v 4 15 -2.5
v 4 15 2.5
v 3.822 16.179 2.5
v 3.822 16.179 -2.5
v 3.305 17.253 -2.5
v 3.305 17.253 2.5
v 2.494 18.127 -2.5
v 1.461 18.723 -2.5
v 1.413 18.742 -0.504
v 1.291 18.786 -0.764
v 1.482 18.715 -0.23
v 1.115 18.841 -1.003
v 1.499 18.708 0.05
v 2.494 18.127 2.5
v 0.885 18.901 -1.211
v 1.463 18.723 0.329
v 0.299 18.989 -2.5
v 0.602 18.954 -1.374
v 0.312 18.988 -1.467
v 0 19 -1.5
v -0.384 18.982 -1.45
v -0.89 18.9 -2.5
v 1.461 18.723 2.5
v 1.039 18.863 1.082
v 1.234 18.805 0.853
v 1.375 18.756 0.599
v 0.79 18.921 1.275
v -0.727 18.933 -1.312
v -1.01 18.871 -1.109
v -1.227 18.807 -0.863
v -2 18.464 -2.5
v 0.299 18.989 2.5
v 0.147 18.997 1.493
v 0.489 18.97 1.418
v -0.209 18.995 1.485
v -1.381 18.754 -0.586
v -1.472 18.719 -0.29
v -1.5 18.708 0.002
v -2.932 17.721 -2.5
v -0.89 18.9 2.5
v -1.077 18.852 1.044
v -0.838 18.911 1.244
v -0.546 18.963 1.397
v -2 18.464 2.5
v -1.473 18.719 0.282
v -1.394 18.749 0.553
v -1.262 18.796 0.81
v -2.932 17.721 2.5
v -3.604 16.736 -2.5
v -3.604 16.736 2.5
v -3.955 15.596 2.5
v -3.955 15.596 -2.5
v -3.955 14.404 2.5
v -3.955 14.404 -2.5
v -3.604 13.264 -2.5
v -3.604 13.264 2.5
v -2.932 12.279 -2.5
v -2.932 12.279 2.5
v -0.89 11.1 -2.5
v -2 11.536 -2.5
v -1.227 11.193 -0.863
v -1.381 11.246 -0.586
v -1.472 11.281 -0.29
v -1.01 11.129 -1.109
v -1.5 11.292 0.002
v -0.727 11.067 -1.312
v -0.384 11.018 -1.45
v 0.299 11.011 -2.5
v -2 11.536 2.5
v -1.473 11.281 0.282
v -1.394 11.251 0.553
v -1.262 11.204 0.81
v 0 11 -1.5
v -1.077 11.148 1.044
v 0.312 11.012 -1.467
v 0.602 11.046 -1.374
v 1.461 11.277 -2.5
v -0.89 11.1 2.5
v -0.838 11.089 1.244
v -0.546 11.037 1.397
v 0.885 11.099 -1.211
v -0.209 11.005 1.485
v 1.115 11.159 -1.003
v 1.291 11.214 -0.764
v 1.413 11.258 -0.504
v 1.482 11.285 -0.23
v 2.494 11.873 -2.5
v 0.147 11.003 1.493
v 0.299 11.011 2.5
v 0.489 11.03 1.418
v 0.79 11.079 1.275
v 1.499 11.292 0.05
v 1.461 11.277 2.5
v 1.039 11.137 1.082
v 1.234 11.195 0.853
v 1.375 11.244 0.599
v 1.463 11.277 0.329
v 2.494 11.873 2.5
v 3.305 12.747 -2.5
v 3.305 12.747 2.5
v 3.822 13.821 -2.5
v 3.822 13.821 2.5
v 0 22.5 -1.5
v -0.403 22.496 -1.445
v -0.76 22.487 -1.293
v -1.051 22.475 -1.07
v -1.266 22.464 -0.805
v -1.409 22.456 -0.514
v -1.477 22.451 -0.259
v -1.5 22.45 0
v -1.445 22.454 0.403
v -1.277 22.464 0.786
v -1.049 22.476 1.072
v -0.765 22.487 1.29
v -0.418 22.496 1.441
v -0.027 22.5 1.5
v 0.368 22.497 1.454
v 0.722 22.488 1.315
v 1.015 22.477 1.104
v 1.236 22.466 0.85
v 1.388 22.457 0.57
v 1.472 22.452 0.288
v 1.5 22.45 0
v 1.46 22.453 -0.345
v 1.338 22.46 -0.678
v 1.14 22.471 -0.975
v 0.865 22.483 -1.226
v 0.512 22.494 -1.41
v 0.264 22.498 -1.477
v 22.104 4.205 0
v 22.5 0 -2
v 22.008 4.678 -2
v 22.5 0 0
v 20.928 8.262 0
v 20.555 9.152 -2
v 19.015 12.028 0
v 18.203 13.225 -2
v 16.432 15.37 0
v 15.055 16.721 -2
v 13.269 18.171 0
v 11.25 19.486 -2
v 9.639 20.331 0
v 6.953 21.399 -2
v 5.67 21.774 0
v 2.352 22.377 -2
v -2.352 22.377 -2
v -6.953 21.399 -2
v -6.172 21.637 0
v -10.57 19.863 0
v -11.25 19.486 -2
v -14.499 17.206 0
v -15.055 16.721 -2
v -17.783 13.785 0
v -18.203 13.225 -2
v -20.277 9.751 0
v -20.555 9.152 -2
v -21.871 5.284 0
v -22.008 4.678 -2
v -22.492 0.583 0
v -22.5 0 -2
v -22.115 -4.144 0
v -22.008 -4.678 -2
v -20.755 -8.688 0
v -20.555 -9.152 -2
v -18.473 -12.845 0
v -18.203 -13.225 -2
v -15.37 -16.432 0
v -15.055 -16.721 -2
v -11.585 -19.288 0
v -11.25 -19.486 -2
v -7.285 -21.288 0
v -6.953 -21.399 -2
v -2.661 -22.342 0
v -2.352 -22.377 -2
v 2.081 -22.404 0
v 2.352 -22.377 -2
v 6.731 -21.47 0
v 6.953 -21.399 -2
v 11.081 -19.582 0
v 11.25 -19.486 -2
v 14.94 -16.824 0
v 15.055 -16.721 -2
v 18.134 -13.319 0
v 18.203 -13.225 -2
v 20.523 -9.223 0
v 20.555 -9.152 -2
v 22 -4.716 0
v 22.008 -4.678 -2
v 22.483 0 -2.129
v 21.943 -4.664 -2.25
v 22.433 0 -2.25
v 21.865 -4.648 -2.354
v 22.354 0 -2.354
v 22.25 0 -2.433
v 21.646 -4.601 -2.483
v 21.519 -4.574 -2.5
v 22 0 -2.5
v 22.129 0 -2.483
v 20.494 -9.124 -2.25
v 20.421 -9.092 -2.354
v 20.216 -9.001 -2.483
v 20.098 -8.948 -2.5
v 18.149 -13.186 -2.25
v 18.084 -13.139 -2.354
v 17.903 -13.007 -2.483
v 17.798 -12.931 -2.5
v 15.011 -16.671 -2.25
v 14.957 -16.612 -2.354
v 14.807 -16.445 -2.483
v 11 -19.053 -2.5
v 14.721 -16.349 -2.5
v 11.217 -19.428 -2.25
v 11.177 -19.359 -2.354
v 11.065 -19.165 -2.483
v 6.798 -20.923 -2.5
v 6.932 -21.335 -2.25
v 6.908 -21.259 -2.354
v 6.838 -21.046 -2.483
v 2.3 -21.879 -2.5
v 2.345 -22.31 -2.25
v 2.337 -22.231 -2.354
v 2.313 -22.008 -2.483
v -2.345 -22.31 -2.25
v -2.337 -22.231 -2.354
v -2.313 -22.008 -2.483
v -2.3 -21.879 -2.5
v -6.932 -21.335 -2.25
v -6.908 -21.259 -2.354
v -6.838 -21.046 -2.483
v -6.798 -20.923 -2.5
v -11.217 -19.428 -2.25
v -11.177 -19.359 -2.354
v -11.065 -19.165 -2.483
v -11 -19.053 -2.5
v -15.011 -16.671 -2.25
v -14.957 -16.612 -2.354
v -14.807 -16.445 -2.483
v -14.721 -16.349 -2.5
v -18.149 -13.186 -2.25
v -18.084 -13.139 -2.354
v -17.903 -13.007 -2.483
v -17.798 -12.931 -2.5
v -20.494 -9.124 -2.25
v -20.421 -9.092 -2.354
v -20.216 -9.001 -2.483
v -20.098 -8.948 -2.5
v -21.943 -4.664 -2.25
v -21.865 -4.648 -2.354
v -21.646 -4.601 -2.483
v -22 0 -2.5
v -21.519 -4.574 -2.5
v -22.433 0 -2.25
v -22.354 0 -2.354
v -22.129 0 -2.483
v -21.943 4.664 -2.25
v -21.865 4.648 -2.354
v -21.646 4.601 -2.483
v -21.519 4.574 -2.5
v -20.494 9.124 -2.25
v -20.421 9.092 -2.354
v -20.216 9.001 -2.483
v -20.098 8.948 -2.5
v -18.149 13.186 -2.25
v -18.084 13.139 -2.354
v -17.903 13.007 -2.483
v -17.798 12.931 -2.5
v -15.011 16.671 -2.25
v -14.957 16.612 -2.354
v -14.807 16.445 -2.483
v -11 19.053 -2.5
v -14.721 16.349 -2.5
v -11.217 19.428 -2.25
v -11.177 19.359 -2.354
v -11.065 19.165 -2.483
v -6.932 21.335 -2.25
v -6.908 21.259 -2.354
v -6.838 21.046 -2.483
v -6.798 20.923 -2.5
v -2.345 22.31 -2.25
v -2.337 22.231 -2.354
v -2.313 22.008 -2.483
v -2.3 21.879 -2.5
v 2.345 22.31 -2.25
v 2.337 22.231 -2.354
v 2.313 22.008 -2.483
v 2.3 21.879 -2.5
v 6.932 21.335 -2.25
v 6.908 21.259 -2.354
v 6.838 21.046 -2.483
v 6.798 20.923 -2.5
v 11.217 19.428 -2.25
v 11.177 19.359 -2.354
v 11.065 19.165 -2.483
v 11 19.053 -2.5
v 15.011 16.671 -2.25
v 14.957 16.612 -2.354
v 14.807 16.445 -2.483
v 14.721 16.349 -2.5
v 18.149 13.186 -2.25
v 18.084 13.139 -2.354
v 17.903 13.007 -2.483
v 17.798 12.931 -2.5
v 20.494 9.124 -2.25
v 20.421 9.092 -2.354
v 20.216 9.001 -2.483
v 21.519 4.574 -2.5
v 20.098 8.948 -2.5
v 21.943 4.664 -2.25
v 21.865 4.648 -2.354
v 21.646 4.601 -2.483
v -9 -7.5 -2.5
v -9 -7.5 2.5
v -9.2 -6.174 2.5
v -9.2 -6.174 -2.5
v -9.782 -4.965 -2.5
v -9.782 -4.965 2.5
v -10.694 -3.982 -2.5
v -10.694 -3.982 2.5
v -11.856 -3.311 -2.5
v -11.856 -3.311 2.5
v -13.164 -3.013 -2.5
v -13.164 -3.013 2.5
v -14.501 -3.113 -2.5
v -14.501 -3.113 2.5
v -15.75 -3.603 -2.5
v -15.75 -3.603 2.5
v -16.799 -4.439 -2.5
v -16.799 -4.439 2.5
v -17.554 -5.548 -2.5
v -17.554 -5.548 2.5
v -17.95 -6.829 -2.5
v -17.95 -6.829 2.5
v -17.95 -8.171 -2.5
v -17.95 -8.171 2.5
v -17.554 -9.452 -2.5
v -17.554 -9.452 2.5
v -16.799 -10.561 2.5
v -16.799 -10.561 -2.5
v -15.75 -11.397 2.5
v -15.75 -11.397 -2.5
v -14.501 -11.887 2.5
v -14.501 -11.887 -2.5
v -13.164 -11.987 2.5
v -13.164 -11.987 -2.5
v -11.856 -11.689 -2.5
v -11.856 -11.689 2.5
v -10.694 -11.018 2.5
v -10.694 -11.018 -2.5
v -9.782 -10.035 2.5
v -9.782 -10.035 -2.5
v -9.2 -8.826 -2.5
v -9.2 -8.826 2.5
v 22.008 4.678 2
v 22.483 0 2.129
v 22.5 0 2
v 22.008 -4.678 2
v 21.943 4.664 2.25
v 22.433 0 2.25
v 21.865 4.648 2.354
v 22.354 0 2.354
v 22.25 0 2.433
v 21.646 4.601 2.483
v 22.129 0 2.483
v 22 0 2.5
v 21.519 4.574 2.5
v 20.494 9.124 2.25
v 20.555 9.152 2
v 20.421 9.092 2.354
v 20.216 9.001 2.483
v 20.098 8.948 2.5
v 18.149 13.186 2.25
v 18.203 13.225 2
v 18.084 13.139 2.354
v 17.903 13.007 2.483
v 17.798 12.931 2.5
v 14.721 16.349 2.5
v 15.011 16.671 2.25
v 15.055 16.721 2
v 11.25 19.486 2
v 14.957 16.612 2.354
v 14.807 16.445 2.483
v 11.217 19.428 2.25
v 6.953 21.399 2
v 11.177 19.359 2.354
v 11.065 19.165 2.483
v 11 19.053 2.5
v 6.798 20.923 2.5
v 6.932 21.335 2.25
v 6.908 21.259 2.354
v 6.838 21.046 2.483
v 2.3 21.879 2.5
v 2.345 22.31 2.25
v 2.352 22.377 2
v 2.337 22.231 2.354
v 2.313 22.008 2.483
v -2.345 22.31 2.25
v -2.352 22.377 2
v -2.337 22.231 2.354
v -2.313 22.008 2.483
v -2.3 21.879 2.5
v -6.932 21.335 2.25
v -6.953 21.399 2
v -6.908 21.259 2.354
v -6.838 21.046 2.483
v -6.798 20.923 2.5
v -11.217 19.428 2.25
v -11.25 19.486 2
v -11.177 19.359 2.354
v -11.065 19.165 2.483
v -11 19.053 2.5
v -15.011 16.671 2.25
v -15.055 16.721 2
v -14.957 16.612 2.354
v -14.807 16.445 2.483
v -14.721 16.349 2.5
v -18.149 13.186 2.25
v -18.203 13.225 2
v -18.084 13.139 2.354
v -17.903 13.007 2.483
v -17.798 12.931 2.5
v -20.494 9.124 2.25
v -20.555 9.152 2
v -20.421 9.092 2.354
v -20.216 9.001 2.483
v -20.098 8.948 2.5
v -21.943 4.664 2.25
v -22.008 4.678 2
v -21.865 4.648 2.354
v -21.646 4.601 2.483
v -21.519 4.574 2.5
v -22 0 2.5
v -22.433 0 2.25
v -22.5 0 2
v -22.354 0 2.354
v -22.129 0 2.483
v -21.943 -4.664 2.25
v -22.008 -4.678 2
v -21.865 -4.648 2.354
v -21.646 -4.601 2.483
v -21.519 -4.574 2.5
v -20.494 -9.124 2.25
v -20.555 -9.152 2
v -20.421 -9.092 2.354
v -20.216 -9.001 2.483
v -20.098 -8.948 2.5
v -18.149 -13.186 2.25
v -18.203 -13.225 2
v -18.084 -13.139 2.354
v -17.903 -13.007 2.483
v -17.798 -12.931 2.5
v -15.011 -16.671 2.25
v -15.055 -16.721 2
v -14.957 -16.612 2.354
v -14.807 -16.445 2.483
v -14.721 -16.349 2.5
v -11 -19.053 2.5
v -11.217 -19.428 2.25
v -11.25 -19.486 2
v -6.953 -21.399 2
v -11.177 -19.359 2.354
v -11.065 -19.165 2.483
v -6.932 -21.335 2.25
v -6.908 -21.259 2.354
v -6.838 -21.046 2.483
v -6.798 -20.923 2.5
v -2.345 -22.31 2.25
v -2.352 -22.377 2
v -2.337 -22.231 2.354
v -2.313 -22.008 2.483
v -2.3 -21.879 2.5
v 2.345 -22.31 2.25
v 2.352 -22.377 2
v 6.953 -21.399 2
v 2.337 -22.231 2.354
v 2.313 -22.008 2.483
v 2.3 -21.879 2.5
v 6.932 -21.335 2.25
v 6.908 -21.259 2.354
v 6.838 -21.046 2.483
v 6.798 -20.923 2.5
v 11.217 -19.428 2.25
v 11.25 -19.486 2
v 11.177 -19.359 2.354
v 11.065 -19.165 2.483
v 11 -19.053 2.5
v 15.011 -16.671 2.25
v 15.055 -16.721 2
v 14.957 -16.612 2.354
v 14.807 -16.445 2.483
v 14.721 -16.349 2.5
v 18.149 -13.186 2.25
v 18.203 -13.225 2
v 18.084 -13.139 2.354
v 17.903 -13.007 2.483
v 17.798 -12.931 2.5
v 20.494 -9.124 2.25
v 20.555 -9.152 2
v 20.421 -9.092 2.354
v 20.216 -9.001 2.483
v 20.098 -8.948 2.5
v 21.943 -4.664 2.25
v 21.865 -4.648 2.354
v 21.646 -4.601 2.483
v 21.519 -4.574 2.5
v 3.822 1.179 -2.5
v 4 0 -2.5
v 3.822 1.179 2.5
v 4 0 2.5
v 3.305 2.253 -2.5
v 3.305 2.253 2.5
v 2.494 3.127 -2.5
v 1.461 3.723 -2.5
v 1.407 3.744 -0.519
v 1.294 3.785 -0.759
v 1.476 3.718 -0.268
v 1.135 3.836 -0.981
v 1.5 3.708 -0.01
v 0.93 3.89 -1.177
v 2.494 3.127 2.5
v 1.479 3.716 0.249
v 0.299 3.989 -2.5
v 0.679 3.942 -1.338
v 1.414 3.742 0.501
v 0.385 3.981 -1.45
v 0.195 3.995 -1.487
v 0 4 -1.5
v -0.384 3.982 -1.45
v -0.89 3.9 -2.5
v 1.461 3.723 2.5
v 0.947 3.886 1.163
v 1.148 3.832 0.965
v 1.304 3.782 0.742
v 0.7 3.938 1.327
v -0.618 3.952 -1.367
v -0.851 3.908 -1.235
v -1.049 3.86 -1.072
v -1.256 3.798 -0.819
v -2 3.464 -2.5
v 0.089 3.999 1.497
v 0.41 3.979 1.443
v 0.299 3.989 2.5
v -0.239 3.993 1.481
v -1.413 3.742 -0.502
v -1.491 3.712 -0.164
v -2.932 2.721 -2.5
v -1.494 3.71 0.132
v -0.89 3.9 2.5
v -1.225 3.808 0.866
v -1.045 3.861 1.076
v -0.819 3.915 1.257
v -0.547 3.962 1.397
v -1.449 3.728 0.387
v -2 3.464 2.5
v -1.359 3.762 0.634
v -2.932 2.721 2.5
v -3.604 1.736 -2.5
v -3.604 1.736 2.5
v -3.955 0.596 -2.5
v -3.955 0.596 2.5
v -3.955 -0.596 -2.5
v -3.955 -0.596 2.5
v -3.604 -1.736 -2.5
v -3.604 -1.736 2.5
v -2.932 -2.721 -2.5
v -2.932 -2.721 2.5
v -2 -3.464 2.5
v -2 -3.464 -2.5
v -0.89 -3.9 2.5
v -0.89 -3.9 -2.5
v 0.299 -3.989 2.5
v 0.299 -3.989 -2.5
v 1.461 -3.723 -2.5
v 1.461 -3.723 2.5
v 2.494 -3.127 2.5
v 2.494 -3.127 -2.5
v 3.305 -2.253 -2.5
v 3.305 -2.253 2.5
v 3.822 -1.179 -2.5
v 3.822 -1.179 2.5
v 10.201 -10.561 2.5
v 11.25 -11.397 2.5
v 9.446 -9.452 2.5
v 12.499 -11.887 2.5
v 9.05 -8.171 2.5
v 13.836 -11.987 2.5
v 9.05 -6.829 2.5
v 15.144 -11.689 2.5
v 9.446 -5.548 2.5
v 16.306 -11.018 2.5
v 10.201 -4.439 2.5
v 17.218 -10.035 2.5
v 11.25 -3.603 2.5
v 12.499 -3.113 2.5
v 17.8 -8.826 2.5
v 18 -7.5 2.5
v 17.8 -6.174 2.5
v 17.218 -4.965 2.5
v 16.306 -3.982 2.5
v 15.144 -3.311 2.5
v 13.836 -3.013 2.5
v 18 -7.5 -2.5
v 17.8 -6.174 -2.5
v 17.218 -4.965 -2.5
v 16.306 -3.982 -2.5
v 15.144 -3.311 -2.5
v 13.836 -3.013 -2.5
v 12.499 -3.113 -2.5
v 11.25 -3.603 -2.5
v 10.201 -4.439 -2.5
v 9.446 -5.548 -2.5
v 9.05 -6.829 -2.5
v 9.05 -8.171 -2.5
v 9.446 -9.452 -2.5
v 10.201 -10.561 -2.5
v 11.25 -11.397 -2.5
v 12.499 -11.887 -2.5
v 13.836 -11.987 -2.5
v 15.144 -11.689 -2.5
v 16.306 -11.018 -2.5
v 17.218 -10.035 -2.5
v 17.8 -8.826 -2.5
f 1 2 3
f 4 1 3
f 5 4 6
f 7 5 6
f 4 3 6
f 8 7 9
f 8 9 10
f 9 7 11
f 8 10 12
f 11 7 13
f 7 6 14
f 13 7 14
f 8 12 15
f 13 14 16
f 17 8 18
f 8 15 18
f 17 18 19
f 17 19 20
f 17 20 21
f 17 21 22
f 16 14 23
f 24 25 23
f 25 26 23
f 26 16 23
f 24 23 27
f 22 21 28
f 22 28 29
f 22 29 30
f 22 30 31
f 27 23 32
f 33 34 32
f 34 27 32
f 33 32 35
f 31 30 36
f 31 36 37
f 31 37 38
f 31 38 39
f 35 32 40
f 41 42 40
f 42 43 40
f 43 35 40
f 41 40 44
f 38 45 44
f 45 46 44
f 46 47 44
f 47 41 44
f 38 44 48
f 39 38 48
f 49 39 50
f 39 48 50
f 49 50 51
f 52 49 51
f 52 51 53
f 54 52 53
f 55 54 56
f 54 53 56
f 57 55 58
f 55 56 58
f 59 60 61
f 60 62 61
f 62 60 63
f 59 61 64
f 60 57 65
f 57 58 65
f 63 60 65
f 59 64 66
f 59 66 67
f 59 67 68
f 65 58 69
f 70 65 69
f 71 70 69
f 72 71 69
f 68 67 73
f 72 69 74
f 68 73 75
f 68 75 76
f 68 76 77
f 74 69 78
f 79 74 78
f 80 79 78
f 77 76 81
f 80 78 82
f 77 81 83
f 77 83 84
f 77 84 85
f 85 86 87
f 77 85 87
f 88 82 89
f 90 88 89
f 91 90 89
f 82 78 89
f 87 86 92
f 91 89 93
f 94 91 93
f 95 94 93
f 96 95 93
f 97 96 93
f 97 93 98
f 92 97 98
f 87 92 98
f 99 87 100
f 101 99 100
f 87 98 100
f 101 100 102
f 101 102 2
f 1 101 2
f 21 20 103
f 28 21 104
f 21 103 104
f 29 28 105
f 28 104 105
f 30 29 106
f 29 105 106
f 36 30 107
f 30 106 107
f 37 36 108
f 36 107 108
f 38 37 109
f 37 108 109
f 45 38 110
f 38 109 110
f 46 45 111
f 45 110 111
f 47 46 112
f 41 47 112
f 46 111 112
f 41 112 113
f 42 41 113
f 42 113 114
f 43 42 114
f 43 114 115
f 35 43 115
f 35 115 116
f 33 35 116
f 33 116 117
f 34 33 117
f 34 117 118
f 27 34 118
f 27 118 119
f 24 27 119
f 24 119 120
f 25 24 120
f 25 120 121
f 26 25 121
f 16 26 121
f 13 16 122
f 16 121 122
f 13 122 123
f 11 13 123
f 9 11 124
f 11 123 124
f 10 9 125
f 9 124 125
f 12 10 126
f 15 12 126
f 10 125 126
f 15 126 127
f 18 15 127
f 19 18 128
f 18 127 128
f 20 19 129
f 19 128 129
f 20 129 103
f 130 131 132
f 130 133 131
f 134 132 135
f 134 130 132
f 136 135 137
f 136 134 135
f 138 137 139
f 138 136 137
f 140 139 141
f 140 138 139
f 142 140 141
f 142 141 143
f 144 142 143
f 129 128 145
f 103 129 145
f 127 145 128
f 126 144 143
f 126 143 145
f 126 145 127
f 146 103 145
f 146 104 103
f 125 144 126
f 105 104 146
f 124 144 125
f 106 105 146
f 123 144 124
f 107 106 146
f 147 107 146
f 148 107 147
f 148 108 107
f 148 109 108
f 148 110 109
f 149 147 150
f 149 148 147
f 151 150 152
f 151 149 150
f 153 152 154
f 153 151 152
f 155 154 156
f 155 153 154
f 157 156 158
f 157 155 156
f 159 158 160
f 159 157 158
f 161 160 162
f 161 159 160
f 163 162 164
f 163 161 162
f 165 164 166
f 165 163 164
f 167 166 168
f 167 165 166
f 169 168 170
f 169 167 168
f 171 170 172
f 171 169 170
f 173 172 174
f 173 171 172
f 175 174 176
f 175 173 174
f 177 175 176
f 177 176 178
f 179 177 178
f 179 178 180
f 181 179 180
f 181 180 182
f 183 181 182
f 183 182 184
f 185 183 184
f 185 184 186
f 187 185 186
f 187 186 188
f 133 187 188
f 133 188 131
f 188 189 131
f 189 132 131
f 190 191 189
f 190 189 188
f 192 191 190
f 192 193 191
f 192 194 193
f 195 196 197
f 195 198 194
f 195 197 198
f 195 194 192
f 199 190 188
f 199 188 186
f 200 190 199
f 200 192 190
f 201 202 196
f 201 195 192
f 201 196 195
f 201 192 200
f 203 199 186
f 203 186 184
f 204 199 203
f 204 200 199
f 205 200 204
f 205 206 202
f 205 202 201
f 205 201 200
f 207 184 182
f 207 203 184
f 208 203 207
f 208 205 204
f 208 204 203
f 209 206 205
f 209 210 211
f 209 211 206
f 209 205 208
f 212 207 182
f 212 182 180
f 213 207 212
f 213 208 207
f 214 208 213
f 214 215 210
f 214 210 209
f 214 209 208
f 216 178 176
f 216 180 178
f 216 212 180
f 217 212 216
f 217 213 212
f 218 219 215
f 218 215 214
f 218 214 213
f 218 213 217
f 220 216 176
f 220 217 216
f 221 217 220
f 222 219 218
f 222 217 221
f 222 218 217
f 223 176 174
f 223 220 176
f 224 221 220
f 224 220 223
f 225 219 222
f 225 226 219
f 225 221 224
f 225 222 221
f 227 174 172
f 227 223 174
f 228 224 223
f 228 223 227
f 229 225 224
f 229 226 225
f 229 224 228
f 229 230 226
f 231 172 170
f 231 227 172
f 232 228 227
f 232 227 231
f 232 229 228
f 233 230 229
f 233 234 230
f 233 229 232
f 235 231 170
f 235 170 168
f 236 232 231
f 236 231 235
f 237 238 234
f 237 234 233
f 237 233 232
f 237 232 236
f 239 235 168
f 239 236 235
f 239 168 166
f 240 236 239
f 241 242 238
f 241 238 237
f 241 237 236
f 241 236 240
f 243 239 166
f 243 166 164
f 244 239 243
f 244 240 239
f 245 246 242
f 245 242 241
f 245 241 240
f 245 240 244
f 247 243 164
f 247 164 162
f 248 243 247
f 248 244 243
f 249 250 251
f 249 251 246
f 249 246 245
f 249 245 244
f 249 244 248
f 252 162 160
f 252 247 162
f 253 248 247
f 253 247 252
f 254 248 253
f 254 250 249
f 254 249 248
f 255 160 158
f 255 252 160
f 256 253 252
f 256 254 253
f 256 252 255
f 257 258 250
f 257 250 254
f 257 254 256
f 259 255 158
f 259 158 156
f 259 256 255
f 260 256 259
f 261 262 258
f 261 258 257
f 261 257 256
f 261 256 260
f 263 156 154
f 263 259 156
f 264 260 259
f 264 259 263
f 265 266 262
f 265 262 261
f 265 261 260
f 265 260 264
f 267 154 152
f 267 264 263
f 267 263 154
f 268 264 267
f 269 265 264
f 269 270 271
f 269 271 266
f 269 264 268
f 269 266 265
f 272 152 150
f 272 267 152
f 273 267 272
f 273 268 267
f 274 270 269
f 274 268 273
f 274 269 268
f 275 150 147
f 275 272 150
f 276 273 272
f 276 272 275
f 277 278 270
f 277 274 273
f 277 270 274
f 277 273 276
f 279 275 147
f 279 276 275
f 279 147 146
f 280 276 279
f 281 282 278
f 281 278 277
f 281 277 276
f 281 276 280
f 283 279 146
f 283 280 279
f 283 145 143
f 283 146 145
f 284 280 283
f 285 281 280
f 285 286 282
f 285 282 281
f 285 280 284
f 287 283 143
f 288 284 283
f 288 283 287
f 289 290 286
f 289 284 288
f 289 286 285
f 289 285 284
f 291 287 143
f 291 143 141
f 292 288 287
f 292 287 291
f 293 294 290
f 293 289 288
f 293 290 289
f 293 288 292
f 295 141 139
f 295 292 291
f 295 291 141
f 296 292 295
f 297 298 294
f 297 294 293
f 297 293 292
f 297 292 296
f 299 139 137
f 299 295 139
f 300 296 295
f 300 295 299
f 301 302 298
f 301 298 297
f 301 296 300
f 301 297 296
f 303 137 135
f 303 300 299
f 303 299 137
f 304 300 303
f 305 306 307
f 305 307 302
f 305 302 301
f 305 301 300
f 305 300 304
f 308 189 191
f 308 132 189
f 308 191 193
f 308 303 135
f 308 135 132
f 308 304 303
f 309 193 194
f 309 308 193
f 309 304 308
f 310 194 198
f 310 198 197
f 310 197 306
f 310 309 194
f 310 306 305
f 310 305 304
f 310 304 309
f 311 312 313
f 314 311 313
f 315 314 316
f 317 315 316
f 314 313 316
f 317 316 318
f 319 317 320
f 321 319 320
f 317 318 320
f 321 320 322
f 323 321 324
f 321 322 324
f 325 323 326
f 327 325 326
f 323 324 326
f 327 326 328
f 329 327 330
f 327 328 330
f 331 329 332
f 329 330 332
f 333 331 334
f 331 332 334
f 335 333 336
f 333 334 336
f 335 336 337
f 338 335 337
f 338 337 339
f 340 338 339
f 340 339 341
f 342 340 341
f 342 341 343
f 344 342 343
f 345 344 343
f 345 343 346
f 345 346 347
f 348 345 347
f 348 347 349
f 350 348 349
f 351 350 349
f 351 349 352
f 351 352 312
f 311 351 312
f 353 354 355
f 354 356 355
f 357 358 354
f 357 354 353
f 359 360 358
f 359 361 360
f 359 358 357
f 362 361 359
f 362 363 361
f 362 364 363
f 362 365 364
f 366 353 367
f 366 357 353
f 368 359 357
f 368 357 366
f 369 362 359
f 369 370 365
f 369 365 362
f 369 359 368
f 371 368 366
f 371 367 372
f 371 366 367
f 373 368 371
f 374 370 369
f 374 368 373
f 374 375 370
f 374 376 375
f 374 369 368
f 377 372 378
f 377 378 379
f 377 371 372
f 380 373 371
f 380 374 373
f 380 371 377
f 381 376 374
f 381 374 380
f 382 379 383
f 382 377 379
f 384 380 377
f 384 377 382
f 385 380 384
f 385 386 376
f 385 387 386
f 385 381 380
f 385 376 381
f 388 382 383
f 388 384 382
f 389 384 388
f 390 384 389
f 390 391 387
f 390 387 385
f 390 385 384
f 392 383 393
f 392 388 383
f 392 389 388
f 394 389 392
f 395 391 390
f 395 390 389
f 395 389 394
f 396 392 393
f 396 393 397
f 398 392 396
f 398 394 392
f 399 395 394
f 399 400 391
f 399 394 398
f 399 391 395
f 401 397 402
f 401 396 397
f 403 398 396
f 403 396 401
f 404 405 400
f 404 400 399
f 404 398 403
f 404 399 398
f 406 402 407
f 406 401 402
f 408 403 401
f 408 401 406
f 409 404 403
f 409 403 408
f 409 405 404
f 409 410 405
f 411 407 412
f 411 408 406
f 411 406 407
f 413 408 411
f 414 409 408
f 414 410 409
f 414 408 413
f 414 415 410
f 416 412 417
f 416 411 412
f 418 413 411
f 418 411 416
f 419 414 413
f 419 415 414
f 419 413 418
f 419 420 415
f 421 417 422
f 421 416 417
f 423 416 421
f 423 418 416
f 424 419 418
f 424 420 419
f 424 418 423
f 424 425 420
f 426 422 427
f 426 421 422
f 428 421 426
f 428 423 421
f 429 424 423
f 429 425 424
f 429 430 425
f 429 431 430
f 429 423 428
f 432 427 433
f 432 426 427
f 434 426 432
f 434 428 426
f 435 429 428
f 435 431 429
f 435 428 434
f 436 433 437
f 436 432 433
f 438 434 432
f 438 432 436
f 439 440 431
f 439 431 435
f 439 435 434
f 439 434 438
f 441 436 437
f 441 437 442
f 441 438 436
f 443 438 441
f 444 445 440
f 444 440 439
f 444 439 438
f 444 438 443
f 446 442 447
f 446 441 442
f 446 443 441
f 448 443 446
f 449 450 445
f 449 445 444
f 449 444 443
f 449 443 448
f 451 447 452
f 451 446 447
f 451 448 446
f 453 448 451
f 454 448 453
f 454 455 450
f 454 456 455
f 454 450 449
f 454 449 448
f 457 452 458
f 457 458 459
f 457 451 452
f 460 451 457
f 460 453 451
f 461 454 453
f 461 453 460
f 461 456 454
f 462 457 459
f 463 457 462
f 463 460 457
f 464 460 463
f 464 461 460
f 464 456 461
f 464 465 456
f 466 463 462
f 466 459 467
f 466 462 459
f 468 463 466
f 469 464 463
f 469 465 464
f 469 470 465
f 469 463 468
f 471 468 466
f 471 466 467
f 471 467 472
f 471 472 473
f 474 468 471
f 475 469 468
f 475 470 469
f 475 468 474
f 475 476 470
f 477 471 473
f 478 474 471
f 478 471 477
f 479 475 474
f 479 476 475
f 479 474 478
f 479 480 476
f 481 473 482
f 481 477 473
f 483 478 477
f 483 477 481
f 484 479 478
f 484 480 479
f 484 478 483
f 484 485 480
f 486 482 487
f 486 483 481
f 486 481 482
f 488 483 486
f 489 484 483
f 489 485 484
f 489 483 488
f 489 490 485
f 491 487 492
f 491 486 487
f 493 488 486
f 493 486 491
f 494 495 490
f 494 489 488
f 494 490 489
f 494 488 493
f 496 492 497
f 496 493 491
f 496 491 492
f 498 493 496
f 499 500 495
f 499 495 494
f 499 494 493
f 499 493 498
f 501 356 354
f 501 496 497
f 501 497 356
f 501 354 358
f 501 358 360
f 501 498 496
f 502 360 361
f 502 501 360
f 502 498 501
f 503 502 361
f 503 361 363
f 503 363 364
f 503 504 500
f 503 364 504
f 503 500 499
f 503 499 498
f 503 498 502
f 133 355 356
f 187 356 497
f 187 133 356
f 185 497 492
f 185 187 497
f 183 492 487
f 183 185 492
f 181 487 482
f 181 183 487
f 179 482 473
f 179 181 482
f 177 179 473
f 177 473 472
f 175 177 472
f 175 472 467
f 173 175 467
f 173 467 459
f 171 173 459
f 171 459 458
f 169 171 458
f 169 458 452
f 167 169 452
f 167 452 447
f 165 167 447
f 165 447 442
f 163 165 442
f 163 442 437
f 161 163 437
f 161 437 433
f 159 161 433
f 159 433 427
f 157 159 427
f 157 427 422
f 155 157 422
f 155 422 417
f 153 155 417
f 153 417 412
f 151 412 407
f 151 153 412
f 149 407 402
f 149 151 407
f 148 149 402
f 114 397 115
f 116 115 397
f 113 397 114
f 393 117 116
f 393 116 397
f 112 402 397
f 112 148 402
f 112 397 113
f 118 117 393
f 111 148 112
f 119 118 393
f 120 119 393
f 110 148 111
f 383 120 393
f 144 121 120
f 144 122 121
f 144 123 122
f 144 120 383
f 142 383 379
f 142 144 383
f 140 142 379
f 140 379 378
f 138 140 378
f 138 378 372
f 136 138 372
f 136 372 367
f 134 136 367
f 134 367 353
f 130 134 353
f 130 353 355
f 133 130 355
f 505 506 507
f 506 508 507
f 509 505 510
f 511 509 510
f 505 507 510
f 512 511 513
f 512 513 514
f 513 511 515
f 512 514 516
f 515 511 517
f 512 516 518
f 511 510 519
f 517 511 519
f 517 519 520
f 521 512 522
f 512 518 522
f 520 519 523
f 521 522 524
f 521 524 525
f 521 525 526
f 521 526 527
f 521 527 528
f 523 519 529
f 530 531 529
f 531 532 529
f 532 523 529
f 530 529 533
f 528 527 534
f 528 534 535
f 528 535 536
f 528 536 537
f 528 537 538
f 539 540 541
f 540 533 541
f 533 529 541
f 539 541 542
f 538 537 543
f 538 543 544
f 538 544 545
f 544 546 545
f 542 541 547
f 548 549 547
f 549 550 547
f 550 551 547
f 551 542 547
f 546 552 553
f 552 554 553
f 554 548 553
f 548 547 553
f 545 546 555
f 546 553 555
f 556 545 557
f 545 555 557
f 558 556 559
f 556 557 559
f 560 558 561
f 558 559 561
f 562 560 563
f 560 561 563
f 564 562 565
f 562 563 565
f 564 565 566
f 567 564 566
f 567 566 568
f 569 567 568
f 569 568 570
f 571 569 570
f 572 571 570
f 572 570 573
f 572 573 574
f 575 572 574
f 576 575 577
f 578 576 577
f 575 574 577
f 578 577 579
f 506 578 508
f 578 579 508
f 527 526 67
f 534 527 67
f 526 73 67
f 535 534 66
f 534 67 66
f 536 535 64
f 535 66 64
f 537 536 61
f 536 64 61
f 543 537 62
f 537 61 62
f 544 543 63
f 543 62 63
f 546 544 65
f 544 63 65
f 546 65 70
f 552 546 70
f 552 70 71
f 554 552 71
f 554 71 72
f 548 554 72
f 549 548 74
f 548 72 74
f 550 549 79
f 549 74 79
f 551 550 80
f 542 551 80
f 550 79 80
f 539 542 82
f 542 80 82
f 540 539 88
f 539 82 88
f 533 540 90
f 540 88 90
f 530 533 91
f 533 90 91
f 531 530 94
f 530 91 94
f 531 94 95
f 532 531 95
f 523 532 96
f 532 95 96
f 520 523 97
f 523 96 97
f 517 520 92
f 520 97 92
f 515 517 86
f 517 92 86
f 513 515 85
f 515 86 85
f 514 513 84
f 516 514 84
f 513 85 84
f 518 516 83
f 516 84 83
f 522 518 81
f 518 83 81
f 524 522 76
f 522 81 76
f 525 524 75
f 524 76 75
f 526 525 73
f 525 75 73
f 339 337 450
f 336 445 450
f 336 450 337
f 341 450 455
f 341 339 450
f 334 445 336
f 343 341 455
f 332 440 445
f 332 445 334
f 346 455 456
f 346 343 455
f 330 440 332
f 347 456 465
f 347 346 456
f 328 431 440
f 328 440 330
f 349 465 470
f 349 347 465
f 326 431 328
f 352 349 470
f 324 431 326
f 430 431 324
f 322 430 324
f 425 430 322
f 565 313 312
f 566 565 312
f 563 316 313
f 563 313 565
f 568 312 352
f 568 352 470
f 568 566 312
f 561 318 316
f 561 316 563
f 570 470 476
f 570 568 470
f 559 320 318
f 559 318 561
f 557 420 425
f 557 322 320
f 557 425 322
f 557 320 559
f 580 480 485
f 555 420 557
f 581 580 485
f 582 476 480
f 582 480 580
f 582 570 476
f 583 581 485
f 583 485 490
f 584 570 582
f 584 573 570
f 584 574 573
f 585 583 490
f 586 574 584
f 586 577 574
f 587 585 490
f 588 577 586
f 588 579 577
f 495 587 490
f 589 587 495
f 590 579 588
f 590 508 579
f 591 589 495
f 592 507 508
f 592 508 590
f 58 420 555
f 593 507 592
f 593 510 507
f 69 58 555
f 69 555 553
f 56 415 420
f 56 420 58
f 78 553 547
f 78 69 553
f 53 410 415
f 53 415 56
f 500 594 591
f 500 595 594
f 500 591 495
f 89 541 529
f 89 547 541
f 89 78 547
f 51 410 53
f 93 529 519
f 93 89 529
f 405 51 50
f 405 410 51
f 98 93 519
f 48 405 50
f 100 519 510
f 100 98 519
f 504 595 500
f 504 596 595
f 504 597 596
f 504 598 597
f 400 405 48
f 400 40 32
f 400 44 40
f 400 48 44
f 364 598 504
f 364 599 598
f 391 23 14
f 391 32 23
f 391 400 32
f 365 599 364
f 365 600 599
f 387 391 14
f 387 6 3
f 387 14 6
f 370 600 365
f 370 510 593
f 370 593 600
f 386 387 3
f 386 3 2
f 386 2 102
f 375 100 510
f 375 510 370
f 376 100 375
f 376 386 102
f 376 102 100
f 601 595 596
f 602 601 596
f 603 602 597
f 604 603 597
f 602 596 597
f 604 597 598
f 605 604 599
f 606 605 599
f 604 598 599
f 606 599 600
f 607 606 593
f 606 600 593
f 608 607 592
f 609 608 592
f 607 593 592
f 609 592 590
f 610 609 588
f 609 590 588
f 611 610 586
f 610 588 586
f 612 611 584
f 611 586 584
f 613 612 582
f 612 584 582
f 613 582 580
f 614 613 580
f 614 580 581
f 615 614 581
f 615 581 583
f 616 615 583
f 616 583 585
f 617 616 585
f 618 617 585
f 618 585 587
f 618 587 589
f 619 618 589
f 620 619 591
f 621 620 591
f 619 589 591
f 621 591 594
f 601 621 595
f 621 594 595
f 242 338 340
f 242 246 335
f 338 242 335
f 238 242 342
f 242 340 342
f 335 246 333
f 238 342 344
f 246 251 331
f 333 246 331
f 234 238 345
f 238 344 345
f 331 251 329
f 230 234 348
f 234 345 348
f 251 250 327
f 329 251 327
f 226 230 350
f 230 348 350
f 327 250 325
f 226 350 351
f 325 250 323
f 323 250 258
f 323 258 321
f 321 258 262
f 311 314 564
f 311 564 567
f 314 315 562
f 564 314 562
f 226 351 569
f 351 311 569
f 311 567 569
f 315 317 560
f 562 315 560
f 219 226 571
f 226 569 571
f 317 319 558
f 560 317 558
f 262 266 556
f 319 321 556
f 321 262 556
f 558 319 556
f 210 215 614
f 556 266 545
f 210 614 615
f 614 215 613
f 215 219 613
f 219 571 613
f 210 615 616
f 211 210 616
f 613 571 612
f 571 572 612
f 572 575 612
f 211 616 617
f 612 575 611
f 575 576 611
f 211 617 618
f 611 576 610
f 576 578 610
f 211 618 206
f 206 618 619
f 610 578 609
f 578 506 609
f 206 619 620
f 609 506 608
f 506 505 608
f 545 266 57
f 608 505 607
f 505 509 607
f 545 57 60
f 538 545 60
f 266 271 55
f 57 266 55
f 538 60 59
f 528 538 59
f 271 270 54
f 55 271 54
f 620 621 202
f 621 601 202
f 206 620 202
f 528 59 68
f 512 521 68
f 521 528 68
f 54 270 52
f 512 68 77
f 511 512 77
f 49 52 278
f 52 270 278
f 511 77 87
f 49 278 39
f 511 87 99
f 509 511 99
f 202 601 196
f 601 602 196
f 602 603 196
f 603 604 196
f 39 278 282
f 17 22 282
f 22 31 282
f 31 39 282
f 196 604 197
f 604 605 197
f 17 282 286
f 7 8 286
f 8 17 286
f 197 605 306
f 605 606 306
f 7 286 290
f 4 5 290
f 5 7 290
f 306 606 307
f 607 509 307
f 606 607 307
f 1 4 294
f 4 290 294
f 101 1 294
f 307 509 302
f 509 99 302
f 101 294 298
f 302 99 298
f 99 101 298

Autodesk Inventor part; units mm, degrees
ref_plane "YZ Plane" through (0, 0, 0) normal (1, 0, 0) x (0, 1, 0)
ref_plane "XY Plane" through (0, 0, 0) normal (0, 0, 1) x (1, 0, 0)
sketch "Sketch1" plane through (0, 0, 0) normal (0, 0, 1) x (1, 0, 0)
  circle A0 centre (0, 0) radius 22.5
  dimension "d0" = 45
extrude "Extrusion1" add sketch "Sketch1" along normal mid plane 5
sketch "Sketch2" plane through (0, 0, 2.5) normal (0, 0, 1) x (1, 0, 0)
  circle A0 centre (0, 0) radius 4
  circle A1 centre (0, 15) radius 4
  circle A2 centre (-13.5, -7.5) radius 4.5
  circle A3 centre (13.5, -7.5) radius 4.5
  dimension "d3" = 8
  dimension "d4" = 15
  dimension "d5" = 8
  dimension "d6" = 7.5
  dimension "d7" = 13.5
  dimension "d8" = 13.5
  dimension "d9" = 9
  dimension "d10" = 9
extrude "Extrusion2" cut sketch "Sketch2" against normal up to surface (5 mm away)
fillet "Fillet1" radius 0.5 2 edges at (-22.5, 0, 2.5) (-22.5, 0, -2.5)
ref_plane "Work Plane1" through (0, 3, 0) normal (0, 1, 0) x (-1, 0, 0)
sketch "Sketch3" plane through (0, 3, 0) normal (0, 1, 0) x (-1, 0, 0)
  line L0 (-4, 2.5) -> (4, 2.5) projected
  line L1 (4, -2.5) -> (-4, -2.5) projected
  line L2 (22.5, 2) -> (-22.5, 2) projected
  line L3 (-22.5, -2) -> (22.5, -2) projected
  line L4 (-22.5, -2) -> (-22.5, 2) projected
  line L5 (22.5, -2) -> (22.5, 2) projected
  point P0 (0, 0)
  point P1 (0, 0)
  point P2 (-22.5, 0)
  point P3 (0, -2)
hole "Hole1" at (0, 3, 0) direction (0, 1, 0) diameter 3 end through all
equation "\"d8\" = d7"
equation "\"d10\" = d9"
equation "\"d11\" = d10"
properties part number "201 part 3" material "Aluminum 6061-AHC"
